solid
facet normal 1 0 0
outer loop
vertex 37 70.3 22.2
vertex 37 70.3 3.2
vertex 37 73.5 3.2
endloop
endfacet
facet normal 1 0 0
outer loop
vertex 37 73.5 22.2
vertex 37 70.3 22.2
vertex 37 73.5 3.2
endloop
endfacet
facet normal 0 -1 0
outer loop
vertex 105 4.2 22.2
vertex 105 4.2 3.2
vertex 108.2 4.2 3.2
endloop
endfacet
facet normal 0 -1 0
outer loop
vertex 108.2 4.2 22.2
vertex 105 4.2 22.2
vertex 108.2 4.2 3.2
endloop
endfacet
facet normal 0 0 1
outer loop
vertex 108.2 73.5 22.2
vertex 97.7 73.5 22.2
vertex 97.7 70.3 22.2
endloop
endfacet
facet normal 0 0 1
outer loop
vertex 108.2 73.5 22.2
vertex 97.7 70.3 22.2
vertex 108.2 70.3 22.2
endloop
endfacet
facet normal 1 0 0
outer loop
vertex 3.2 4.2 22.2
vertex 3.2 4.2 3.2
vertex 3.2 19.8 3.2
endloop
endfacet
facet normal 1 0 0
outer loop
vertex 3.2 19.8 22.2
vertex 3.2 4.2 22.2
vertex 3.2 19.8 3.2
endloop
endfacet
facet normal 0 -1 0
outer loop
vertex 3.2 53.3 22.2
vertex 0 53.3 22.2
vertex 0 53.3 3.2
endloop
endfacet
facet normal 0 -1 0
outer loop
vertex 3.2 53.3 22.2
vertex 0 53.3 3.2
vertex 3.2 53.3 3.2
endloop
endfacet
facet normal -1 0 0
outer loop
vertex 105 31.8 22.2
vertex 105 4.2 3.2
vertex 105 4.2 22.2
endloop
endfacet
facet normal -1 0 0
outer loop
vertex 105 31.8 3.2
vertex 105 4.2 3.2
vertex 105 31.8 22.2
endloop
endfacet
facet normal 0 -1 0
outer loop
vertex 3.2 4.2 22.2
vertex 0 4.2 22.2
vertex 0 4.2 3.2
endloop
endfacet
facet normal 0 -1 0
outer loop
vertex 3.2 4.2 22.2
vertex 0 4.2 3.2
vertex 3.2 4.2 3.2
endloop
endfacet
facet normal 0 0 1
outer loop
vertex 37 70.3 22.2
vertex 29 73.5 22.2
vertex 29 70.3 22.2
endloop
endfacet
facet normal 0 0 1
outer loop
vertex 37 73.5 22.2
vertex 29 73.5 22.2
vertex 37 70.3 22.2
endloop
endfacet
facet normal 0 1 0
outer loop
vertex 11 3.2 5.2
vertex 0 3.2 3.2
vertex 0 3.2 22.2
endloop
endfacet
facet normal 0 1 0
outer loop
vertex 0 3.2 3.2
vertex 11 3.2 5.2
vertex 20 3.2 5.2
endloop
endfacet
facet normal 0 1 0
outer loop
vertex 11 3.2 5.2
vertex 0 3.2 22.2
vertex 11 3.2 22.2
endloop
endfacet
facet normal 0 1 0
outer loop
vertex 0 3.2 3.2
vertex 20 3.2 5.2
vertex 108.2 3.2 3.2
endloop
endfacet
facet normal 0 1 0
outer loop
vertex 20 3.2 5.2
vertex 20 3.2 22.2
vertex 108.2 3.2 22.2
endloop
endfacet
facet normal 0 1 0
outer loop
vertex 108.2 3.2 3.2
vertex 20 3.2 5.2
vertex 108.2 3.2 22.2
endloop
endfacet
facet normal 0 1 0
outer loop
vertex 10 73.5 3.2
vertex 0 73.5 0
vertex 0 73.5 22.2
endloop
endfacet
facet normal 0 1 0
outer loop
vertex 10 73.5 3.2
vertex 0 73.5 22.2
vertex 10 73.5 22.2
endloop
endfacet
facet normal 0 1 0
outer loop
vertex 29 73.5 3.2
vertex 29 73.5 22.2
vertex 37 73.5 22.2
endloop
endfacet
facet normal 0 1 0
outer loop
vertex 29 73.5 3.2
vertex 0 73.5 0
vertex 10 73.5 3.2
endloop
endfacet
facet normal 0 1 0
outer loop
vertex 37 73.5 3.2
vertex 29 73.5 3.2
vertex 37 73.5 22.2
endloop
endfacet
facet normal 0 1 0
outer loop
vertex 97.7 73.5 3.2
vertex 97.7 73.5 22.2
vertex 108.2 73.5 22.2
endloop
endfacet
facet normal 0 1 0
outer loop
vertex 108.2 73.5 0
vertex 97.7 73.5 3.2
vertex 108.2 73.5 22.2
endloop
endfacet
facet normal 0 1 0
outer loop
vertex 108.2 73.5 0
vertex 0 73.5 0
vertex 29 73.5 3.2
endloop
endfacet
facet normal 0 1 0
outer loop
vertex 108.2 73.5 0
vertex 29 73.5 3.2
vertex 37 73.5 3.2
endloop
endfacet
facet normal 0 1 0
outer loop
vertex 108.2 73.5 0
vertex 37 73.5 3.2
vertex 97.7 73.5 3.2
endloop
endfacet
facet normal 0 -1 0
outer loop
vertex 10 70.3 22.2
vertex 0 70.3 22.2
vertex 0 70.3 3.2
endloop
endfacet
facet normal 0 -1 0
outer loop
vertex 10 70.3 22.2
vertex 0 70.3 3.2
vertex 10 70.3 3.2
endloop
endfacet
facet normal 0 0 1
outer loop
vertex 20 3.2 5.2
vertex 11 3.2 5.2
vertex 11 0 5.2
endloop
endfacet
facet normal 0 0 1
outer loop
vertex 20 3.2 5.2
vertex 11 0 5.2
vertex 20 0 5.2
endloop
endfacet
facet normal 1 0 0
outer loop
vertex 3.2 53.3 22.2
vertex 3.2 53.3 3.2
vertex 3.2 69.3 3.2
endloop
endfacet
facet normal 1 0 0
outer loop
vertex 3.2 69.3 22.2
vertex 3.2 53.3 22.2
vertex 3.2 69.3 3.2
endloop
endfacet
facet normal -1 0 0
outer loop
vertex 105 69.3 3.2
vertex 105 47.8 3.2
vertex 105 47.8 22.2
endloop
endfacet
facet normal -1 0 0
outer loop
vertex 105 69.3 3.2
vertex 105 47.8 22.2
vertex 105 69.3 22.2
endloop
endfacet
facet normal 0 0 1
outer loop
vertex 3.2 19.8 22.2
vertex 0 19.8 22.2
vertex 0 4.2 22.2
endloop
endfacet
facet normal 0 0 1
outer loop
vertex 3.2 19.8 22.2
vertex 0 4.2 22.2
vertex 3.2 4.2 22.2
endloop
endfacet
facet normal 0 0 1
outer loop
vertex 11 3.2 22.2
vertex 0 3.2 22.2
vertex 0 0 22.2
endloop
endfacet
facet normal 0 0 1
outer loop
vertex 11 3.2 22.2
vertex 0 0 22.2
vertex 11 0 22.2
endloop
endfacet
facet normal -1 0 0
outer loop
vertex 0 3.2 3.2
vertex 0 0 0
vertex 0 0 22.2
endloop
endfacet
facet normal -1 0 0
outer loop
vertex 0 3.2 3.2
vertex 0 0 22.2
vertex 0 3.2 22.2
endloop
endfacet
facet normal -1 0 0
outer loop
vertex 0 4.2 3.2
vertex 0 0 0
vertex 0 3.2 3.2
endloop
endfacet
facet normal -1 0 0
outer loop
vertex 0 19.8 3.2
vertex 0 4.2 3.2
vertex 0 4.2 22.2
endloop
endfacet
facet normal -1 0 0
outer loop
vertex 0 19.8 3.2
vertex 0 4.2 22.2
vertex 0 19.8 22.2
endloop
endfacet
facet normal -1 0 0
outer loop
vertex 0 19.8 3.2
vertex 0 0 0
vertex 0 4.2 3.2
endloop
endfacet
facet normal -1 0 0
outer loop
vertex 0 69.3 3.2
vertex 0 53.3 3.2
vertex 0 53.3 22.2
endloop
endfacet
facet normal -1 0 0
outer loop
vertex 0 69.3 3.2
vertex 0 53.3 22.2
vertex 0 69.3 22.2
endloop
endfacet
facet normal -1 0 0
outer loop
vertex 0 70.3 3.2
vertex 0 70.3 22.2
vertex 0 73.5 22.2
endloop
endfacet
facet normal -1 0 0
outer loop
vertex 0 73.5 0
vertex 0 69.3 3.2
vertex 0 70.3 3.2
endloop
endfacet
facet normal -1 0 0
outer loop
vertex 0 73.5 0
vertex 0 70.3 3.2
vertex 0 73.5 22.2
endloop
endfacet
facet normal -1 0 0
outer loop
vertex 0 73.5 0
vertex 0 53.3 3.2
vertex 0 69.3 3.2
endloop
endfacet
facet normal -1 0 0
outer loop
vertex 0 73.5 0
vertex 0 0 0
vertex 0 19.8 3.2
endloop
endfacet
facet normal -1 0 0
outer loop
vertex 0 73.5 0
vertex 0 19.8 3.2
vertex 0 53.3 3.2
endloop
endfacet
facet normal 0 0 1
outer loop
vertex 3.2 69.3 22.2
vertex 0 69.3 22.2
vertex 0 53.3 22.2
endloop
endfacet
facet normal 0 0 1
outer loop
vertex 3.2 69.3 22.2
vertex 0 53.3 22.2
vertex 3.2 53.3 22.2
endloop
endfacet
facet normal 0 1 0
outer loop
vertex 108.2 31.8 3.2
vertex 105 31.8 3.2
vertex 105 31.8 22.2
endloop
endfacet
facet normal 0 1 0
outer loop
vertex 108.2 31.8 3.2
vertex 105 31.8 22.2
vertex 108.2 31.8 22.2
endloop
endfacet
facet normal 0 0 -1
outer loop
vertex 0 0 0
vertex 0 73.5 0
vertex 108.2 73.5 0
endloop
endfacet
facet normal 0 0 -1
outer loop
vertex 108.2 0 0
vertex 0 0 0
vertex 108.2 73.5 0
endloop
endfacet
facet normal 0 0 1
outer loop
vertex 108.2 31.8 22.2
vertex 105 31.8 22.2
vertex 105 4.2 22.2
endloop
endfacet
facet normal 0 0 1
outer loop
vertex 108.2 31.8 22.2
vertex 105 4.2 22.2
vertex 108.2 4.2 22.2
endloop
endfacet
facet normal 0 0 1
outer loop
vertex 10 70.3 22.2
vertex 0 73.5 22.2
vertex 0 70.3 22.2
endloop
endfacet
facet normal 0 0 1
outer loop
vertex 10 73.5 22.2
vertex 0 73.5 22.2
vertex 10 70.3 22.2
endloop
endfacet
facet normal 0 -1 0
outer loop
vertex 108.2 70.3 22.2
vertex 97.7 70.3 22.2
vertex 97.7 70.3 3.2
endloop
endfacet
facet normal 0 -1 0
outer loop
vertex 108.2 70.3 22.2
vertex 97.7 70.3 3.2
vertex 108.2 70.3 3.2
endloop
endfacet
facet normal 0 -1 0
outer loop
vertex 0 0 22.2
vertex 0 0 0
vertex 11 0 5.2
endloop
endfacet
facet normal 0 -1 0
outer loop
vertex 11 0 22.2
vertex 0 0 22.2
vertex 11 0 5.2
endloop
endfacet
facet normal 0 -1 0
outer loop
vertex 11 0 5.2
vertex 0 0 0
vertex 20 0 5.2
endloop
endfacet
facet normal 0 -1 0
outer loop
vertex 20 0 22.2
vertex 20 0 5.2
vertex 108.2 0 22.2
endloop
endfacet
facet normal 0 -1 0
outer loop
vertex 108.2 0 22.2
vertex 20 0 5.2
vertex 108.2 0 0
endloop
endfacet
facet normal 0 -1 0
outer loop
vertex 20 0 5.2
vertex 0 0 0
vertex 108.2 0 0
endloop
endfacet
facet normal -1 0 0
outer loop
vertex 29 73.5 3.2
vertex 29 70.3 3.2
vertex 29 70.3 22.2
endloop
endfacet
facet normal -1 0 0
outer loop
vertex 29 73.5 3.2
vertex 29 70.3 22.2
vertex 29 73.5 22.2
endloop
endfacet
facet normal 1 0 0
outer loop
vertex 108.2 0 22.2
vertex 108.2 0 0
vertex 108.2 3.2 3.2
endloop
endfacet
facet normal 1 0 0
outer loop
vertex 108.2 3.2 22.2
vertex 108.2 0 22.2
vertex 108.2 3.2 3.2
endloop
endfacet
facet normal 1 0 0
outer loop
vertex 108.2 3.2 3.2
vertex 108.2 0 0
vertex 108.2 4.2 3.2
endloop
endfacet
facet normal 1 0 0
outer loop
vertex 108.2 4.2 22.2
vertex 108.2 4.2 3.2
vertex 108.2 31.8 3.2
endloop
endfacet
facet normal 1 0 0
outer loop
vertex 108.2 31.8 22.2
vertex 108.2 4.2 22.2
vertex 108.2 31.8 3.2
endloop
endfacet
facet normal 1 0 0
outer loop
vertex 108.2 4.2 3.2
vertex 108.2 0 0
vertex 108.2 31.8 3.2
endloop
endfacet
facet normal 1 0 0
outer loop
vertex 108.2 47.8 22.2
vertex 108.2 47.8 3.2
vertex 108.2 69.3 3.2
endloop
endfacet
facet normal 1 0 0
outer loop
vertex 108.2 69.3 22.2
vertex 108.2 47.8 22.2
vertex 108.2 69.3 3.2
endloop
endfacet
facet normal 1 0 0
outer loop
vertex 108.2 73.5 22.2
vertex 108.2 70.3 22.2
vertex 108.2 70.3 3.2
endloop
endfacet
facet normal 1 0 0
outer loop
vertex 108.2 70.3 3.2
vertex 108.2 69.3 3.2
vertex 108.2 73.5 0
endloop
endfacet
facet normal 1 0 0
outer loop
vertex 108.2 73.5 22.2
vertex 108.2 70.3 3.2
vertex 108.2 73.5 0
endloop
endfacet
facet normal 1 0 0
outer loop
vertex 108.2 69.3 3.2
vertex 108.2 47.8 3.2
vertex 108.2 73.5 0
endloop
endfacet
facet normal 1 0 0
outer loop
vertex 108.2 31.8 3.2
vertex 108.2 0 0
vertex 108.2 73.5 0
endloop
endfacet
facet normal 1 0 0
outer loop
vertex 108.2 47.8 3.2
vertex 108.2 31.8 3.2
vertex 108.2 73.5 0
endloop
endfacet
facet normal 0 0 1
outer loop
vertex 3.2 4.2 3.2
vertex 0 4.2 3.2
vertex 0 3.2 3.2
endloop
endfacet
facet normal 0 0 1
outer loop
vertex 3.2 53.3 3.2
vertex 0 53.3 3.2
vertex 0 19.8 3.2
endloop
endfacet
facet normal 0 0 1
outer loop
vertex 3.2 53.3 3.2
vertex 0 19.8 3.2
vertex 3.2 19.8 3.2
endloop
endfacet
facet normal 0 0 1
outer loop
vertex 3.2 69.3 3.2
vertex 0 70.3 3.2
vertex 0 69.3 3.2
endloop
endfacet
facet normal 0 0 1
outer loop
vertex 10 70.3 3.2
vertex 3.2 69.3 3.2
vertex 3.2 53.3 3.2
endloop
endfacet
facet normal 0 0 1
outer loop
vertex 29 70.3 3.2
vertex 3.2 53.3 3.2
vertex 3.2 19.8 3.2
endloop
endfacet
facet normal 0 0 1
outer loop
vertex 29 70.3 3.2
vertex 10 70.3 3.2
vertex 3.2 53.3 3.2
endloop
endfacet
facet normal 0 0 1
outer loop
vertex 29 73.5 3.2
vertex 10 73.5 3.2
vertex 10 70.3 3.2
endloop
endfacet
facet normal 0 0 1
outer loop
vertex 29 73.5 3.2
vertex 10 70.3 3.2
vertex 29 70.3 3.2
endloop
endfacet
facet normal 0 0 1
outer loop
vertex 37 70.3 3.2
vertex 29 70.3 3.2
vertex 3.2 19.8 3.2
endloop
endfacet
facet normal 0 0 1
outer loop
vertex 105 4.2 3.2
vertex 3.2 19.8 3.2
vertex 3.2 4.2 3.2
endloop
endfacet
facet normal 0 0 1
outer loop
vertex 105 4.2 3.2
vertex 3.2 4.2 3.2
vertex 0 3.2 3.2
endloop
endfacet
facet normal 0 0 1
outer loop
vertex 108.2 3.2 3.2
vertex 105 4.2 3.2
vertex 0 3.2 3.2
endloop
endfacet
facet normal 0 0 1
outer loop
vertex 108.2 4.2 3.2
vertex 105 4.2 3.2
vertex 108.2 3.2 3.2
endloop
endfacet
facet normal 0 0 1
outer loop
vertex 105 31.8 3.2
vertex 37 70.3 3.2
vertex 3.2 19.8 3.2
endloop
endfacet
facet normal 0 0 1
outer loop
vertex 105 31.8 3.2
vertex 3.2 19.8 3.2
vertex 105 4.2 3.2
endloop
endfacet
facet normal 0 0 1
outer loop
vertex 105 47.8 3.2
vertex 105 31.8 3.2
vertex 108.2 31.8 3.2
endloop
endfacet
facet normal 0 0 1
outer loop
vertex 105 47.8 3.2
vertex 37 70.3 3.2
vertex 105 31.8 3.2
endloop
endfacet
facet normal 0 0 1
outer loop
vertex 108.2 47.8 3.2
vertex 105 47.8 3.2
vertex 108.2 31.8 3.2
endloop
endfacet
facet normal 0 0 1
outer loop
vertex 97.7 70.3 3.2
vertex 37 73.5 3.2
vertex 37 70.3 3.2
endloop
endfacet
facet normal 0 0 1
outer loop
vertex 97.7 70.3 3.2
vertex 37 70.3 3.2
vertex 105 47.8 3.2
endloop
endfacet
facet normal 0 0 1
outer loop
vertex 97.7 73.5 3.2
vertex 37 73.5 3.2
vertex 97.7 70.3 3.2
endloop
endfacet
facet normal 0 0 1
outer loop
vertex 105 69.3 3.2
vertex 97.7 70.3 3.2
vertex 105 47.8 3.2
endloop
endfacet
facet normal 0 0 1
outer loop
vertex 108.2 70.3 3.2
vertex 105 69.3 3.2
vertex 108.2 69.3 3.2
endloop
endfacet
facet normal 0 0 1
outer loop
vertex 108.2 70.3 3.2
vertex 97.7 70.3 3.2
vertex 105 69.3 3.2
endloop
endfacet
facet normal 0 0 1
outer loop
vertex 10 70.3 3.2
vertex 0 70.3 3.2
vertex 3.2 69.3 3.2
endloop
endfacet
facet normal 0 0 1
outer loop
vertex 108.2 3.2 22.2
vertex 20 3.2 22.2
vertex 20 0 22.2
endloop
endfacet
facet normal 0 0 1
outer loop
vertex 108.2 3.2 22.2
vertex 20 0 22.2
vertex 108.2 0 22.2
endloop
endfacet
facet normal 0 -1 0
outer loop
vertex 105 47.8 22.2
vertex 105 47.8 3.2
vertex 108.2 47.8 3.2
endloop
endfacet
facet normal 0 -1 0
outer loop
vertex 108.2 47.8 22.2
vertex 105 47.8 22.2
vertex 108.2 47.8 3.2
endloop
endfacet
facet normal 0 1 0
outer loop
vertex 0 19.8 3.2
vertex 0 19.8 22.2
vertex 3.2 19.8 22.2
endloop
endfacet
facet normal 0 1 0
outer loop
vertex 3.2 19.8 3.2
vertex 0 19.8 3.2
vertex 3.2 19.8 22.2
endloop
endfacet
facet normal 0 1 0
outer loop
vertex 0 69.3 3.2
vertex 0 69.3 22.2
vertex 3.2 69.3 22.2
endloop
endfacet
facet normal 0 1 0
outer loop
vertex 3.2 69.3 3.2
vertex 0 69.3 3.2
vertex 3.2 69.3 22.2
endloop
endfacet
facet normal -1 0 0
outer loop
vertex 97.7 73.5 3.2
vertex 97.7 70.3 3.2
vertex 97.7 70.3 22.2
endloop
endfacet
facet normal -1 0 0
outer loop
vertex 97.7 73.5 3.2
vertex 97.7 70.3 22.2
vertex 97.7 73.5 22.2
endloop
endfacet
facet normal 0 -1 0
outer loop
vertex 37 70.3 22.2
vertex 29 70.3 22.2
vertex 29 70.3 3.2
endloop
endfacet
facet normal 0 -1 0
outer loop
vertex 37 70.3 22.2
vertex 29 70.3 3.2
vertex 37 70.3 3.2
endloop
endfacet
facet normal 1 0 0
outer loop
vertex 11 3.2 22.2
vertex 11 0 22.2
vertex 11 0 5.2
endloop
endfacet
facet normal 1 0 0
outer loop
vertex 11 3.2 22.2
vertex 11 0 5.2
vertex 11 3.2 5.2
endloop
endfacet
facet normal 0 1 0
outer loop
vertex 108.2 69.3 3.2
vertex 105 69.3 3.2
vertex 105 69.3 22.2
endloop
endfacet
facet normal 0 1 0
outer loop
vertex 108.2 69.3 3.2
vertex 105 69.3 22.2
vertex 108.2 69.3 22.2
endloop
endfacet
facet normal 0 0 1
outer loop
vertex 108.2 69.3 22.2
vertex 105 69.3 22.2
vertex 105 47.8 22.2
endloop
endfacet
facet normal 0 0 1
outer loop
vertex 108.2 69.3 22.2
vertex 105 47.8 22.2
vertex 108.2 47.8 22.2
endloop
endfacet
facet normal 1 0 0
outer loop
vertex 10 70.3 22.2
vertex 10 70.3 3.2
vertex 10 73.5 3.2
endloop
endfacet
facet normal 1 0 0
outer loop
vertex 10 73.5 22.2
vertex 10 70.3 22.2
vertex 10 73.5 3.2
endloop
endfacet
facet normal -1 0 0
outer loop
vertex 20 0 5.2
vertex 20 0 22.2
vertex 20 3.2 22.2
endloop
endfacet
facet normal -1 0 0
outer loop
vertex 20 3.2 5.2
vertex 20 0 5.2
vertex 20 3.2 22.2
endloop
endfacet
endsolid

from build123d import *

# Parameters (mm, degrees)
SKETCH1_W           = 108.2
SKETCH1_H           = 73.5
BOSS_EXTRUDE2_DEPTH = 3.2
SKETCH2_W           = 108.2
SKETCH2_H           = 73.5
SKETCH2_W_2         = 101.8
SKETCH2_H_2         = 67.1
BOSS_EXTRUDE3_DEPTH = 19
SKETCH3_W           = 3.2
SKETCH3_H           = 1
CUT_EXTRUDE1_DEPTH  = 19
SKETCH4_W           = 3.2
SKETCH4_H           = 33.5
CUT_EXTRUDE2_DEPTH  = 19
SKETCH5_W           = 19
SKETCH5_H           = 3.2
SKETCH5_W_2         = 60.7
CUT_EXTRUDE3_DEPTH  = 19
SKETCH6_W           = 3.2
SKETCH6_H           = 16
CUT_EXTRUDE4_DEPTH  = 19
SKETCH7_W           = 9
SKETCH7_H           = 3.2
CUT_EXTRUDE5_DEPTH  = 17


with BuildPart() as part:
    # Sketch1 → Boss-Extrude2 (new body)
    with BuildSketch(Plane.XY):
        with Locations((54.1, 36.75)):
            Rectangle(SKETCH1_W, SKETCH1_H)
    extrude(amount=BOSS_EXTRUDE2_DEPTH)

    # Sketch2 → Boss-Extrude3 (add)
    with BuildSketch(Plane.XY.offset(3.2)):
        with Locations((54.1, 36.75)):
            Rectangle(SKETCH2_W, SKETCH2_H)
        with Locations((54.1, 36.75)):
            Rectangle(SKETCH2_W_2, SKETCH2_H_2, mode=Mode.SUBTRACT)
    extrude(amount=BOSS_EXTRUDE3_DEPTH)

    # Sketch3 → Cut-Extrude1 (cut)
    with BuildSketch(Plane.XY.offset(22.2)):
        with Locations((1.6, 69.8)):
            Rectangle(SKETCH3_W, SKETCH3_H)
        with Locations((106.6, 69.8)):
            Rectangle(SKETCH3_W, SKETCH3_H)
        with Locations((106.6, 3.7)):
            Rectangle(SKETCH3_W, SKETCH3_H)
        with Locations((1.6, 3.7)):
            Rectangle(SKETCH3_W, SKETCH3_H)
    extrude(amount=-CUT_EXTRUDE1_DEPTH, mode=Mode.SUBTRACT)

    # Sketch4 → Cut-Extrude2 (cut)
    with BuildSketch(Plane.XY.offset(22.2)):
        with Locations((1.6, 36.55)):
            Rectangle(SKETCH4_W, SKETCH4_H)
    extrude(amount=-CUT_EXTRUDE2_DEPTH, mode=Mode.SUBTRACT)

    # Sketch5 → Cut-Extrude3 (cut)
    with BuildSketch(Plane.XY.offset(22.2)):
        with Locations((19.5, 71.9)):
            Rectangle(SKETCH5_W, SKETCH5_H)
        with Locations((67.35, 71.9)):
            Rectangle(SKETCH5_W_2, SKETCH5_H)
    extrude(amount=-CUT_EXTRUDE3_DEPTH, mode=Mode.SUBTRACT)

    # Sketch6 → Cut-Extrude4 (cut)
    with BuildSketch(Plane.XY.offset(22.2)):
        with Locations((106.6, 39.8)):
            Rectangle(SKETCH6_W, SKETCH6_H)
    extrude(amount=-CUT_EXTRUDE4_DEPTH, mode=Mode.SUBTRACT)

    # Sketch7 → Cut-Extrude5 (cut)
    with BuildSketch(Plane.XY.offset(22.2)):
        with Locations((15.5, 1.6)):
            Rectangle(SKETCH7_W, SKETCH7_H)
    extrude(amount=-CUT_EXTRUDE5_DEPTH, mode=Mode.SUBTRACT)


solid = part.part
